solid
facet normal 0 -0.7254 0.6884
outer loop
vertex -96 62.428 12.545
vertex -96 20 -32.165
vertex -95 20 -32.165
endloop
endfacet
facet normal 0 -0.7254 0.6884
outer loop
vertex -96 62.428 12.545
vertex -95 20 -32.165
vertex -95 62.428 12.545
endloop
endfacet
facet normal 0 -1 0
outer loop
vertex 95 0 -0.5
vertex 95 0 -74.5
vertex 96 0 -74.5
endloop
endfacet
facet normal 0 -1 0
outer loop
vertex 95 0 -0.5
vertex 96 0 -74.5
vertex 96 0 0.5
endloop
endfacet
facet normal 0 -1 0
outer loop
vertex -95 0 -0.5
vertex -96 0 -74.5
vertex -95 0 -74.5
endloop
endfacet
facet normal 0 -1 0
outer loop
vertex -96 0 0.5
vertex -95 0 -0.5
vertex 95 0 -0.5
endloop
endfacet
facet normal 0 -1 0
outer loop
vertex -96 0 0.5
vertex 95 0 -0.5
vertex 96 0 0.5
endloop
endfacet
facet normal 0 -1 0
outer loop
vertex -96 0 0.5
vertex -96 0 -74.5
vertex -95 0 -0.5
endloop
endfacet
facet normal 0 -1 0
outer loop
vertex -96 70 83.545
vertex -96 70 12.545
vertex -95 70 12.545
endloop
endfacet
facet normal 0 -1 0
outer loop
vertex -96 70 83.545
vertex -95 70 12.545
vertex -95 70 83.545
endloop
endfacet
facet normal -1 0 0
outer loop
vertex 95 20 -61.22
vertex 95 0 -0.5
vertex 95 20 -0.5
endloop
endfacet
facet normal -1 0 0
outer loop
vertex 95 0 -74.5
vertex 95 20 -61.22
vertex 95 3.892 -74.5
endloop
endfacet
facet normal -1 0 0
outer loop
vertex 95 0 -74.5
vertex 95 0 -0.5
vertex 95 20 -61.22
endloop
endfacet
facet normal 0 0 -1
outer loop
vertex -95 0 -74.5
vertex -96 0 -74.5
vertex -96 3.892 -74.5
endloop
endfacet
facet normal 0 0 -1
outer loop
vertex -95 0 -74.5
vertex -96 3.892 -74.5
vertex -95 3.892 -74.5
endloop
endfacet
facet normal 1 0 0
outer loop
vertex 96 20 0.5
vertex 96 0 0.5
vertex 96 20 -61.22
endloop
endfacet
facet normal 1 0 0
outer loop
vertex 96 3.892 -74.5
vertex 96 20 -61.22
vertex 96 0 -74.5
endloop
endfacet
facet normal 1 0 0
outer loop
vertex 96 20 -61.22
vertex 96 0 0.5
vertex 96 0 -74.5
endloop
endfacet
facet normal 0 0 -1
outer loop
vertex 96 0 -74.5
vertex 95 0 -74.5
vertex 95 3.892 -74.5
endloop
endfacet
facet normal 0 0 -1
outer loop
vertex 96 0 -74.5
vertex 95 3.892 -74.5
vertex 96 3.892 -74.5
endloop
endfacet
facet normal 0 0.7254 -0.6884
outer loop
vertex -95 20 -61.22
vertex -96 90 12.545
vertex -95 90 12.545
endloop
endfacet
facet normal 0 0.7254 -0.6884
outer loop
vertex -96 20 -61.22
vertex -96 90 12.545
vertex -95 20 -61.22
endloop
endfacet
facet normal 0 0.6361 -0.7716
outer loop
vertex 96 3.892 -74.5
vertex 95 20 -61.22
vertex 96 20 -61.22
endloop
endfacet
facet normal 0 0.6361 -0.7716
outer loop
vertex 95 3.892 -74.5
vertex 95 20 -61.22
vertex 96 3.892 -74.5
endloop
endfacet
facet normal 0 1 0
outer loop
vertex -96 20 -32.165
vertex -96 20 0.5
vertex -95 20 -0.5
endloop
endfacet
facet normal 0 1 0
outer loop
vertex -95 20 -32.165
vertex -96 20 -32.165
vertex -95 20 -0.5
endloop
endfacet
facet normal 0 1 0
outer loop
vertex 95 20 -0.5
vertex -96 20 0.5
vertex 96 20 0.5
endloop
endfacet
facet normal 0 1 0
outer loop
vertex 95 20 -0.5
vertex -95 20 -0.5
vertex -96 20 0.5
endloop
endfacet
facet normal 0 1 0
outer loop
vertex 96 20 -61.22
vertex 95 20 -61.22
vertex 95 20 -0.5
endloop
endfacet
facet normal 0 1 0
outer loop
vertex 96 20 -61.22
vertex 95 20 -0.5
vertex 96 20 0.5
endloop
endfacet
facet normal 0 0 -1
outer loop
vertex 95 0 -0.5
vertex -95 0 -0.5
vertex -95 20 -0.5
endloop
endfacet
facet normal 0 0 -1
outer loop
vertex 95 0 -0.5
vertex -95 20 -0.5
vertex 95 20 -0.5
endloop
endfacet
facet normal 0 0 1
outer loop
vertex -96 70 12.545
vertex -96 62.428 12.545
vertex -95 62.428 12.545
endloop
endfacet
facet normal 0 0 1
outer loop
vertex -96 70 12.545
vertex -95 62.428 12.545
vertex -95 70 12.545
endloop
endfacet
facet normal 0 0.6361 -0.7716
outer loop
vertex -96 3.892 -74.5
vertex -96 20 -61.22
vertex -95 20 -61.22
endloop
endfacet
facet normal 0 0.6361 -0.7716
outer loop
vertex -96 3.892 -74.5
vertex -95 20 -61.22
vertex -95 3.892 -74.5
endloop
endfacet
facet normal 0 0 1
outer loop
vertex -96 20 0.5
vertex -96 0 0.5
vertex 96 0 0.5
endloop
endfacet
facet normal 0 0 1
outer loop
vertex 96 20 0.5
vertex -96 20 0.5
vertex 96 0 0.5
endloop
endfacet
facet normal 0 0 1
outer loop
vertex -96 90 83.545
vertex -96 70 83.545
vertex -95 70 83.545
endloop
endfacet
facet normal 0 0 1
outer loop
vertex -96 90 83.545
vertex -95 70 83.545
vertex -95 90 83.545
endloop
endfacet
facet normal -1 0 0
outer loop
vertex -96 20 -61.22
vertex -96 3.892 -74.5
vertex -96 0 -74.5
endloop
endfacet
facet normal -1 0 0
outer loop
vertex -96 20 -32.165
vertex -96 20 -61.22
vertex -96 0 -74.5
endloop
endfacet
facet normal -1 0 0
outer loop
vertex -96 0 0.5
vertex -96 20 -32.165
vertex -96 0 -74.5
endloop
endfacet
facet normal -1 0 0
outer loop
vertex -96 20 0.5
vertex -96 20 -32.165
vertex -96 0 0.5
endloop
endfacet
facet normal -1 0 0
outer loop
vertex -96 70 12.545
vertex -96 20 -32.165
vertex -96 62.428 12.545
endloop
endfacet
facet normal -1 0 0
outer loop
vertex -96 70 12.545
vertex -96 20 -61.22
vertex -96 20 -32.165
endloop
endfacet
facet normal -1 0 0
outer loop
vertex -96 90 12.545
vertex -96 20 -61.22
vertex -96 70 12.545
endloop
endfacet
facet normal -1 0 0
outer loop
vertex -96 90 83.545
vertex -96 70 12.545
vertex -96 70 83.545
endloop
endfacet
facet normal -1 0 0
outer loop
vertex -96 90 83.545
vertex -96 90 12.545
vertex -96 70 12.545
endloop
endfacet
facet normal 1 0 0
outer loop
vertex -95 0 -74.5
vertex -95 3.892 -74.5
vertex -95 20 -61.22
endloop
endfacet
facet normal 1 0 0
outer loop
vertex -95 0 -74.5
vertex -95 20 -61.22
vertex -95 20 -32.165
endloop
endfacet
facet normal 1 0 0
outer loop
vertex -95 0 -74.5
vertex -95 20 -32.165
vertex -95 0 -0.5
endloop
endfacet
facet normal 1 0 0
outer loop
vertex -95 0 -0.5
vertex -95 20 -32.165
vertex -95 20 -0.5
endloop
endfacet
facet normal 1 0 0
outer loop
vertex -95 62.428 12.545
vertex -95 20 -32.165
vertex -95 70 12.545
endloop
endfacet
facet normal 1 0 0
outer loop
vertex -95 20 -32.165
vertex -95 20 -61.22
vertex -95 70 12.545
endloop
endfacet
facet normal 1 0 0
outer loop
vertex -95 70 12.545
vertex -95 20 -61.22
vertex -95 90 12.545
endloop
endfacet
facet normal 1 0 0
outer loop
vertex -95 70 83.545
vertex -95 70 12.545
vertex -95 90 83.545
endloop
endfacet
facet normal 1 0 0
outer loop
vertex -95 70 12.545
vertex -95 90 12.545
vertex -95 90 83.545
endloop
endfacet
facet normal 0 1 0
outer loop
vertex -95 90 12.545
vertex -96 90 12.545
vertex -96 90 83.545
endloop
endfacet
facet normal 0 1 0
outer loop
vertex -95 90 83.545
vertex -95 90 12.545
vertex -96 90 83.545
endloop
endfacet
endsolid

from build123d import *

# Parameters (mm, degrees)
CROQUIS1_W              = 1
CROQUIS1_H              = 74
CROQUIS1_H_2            = 1
CROQUIS1_W_2            = 190
SALIENTE_EXTRUIR1_DEPTH = 20
SALIENTE_EXTRUIR2_DEPTH = 1
CORTAR_EXTRUIR1_DEPTH   = 225.75375414
CROQUIS4_W              = 71
CROQUIS4_H              = 20
SALIENTE_EXTRUIR3_DEPTH = 1


with BuildPart() as part:
    # Croquis1 → Saliente-Extruir1 (new body)
    with BuildSketch(Plane(origin=(0, 0, 0), x_dir=(1, 0, 0), z_dir=(0, 1, 0))):
        with Locations((-95.5, 37.5)):
            Rectangle(CROQUIS1_W, CROQUIS1_H)
        with Locations((-95.5, 0)):
            Rectangle(CROQUIS1_W, CROQUIS1_H_2)
        Rectangle(CROQUIS1_W_2, CROQUIS1_H_2)
        with Locations((95.5, 37.5)):
            Rectangle(CROQUIS1_W, CROQUIS1_H)
        with Locations((95.5, 0)):
            Rectangle(CROQUIS1_W, CROQUIS1_H_2)
    extrude(amount=SALIENTE_EXTRUIR1_DEPTH)

    # Croquis2 → Saliente-Extruir2 (add)
    with BuildSketch(Plane.ZY.offset(96)):
        Polygon((12.544924521, 90), (-61.219684248, 20), (-32.164890823, 20), (12.544924521, 62.428030546), align=None)
        Polygon((-61.219684248, 20), (-74.5, 7.397450917), (-67.480081196, 0), (-53.240493329, 0), (-32.164890823, 20), align=None)
    extrude(amount=-SALIENTE_EXTRUIR2_DEPTH)

    # Croquis3 → Cortar-Extruir1 (cut, through all)
    with BuildSketch(Plane.ZY.offset(96)):
        Polygon((-61.219684248, 20), (-74.5, 3.892353298), (-74.5, 20), align=None)
    extrude(amount=-CORTAR_EXTRUIR1_DEPTH, mode=Mode.SUBTRACT)

    # Croquis4 → Saliente-Extruir3 (add)
    with BuildSketch(Plane.ZY.offset(96)):
        with Locations((48.044924521, 80)):
            Rectangle(CROQUIS4_W, CROQUIS4_H)
    extrude(amount=-SALIENTE_EXTRUIR3_DEPTH)


solid = part.part
